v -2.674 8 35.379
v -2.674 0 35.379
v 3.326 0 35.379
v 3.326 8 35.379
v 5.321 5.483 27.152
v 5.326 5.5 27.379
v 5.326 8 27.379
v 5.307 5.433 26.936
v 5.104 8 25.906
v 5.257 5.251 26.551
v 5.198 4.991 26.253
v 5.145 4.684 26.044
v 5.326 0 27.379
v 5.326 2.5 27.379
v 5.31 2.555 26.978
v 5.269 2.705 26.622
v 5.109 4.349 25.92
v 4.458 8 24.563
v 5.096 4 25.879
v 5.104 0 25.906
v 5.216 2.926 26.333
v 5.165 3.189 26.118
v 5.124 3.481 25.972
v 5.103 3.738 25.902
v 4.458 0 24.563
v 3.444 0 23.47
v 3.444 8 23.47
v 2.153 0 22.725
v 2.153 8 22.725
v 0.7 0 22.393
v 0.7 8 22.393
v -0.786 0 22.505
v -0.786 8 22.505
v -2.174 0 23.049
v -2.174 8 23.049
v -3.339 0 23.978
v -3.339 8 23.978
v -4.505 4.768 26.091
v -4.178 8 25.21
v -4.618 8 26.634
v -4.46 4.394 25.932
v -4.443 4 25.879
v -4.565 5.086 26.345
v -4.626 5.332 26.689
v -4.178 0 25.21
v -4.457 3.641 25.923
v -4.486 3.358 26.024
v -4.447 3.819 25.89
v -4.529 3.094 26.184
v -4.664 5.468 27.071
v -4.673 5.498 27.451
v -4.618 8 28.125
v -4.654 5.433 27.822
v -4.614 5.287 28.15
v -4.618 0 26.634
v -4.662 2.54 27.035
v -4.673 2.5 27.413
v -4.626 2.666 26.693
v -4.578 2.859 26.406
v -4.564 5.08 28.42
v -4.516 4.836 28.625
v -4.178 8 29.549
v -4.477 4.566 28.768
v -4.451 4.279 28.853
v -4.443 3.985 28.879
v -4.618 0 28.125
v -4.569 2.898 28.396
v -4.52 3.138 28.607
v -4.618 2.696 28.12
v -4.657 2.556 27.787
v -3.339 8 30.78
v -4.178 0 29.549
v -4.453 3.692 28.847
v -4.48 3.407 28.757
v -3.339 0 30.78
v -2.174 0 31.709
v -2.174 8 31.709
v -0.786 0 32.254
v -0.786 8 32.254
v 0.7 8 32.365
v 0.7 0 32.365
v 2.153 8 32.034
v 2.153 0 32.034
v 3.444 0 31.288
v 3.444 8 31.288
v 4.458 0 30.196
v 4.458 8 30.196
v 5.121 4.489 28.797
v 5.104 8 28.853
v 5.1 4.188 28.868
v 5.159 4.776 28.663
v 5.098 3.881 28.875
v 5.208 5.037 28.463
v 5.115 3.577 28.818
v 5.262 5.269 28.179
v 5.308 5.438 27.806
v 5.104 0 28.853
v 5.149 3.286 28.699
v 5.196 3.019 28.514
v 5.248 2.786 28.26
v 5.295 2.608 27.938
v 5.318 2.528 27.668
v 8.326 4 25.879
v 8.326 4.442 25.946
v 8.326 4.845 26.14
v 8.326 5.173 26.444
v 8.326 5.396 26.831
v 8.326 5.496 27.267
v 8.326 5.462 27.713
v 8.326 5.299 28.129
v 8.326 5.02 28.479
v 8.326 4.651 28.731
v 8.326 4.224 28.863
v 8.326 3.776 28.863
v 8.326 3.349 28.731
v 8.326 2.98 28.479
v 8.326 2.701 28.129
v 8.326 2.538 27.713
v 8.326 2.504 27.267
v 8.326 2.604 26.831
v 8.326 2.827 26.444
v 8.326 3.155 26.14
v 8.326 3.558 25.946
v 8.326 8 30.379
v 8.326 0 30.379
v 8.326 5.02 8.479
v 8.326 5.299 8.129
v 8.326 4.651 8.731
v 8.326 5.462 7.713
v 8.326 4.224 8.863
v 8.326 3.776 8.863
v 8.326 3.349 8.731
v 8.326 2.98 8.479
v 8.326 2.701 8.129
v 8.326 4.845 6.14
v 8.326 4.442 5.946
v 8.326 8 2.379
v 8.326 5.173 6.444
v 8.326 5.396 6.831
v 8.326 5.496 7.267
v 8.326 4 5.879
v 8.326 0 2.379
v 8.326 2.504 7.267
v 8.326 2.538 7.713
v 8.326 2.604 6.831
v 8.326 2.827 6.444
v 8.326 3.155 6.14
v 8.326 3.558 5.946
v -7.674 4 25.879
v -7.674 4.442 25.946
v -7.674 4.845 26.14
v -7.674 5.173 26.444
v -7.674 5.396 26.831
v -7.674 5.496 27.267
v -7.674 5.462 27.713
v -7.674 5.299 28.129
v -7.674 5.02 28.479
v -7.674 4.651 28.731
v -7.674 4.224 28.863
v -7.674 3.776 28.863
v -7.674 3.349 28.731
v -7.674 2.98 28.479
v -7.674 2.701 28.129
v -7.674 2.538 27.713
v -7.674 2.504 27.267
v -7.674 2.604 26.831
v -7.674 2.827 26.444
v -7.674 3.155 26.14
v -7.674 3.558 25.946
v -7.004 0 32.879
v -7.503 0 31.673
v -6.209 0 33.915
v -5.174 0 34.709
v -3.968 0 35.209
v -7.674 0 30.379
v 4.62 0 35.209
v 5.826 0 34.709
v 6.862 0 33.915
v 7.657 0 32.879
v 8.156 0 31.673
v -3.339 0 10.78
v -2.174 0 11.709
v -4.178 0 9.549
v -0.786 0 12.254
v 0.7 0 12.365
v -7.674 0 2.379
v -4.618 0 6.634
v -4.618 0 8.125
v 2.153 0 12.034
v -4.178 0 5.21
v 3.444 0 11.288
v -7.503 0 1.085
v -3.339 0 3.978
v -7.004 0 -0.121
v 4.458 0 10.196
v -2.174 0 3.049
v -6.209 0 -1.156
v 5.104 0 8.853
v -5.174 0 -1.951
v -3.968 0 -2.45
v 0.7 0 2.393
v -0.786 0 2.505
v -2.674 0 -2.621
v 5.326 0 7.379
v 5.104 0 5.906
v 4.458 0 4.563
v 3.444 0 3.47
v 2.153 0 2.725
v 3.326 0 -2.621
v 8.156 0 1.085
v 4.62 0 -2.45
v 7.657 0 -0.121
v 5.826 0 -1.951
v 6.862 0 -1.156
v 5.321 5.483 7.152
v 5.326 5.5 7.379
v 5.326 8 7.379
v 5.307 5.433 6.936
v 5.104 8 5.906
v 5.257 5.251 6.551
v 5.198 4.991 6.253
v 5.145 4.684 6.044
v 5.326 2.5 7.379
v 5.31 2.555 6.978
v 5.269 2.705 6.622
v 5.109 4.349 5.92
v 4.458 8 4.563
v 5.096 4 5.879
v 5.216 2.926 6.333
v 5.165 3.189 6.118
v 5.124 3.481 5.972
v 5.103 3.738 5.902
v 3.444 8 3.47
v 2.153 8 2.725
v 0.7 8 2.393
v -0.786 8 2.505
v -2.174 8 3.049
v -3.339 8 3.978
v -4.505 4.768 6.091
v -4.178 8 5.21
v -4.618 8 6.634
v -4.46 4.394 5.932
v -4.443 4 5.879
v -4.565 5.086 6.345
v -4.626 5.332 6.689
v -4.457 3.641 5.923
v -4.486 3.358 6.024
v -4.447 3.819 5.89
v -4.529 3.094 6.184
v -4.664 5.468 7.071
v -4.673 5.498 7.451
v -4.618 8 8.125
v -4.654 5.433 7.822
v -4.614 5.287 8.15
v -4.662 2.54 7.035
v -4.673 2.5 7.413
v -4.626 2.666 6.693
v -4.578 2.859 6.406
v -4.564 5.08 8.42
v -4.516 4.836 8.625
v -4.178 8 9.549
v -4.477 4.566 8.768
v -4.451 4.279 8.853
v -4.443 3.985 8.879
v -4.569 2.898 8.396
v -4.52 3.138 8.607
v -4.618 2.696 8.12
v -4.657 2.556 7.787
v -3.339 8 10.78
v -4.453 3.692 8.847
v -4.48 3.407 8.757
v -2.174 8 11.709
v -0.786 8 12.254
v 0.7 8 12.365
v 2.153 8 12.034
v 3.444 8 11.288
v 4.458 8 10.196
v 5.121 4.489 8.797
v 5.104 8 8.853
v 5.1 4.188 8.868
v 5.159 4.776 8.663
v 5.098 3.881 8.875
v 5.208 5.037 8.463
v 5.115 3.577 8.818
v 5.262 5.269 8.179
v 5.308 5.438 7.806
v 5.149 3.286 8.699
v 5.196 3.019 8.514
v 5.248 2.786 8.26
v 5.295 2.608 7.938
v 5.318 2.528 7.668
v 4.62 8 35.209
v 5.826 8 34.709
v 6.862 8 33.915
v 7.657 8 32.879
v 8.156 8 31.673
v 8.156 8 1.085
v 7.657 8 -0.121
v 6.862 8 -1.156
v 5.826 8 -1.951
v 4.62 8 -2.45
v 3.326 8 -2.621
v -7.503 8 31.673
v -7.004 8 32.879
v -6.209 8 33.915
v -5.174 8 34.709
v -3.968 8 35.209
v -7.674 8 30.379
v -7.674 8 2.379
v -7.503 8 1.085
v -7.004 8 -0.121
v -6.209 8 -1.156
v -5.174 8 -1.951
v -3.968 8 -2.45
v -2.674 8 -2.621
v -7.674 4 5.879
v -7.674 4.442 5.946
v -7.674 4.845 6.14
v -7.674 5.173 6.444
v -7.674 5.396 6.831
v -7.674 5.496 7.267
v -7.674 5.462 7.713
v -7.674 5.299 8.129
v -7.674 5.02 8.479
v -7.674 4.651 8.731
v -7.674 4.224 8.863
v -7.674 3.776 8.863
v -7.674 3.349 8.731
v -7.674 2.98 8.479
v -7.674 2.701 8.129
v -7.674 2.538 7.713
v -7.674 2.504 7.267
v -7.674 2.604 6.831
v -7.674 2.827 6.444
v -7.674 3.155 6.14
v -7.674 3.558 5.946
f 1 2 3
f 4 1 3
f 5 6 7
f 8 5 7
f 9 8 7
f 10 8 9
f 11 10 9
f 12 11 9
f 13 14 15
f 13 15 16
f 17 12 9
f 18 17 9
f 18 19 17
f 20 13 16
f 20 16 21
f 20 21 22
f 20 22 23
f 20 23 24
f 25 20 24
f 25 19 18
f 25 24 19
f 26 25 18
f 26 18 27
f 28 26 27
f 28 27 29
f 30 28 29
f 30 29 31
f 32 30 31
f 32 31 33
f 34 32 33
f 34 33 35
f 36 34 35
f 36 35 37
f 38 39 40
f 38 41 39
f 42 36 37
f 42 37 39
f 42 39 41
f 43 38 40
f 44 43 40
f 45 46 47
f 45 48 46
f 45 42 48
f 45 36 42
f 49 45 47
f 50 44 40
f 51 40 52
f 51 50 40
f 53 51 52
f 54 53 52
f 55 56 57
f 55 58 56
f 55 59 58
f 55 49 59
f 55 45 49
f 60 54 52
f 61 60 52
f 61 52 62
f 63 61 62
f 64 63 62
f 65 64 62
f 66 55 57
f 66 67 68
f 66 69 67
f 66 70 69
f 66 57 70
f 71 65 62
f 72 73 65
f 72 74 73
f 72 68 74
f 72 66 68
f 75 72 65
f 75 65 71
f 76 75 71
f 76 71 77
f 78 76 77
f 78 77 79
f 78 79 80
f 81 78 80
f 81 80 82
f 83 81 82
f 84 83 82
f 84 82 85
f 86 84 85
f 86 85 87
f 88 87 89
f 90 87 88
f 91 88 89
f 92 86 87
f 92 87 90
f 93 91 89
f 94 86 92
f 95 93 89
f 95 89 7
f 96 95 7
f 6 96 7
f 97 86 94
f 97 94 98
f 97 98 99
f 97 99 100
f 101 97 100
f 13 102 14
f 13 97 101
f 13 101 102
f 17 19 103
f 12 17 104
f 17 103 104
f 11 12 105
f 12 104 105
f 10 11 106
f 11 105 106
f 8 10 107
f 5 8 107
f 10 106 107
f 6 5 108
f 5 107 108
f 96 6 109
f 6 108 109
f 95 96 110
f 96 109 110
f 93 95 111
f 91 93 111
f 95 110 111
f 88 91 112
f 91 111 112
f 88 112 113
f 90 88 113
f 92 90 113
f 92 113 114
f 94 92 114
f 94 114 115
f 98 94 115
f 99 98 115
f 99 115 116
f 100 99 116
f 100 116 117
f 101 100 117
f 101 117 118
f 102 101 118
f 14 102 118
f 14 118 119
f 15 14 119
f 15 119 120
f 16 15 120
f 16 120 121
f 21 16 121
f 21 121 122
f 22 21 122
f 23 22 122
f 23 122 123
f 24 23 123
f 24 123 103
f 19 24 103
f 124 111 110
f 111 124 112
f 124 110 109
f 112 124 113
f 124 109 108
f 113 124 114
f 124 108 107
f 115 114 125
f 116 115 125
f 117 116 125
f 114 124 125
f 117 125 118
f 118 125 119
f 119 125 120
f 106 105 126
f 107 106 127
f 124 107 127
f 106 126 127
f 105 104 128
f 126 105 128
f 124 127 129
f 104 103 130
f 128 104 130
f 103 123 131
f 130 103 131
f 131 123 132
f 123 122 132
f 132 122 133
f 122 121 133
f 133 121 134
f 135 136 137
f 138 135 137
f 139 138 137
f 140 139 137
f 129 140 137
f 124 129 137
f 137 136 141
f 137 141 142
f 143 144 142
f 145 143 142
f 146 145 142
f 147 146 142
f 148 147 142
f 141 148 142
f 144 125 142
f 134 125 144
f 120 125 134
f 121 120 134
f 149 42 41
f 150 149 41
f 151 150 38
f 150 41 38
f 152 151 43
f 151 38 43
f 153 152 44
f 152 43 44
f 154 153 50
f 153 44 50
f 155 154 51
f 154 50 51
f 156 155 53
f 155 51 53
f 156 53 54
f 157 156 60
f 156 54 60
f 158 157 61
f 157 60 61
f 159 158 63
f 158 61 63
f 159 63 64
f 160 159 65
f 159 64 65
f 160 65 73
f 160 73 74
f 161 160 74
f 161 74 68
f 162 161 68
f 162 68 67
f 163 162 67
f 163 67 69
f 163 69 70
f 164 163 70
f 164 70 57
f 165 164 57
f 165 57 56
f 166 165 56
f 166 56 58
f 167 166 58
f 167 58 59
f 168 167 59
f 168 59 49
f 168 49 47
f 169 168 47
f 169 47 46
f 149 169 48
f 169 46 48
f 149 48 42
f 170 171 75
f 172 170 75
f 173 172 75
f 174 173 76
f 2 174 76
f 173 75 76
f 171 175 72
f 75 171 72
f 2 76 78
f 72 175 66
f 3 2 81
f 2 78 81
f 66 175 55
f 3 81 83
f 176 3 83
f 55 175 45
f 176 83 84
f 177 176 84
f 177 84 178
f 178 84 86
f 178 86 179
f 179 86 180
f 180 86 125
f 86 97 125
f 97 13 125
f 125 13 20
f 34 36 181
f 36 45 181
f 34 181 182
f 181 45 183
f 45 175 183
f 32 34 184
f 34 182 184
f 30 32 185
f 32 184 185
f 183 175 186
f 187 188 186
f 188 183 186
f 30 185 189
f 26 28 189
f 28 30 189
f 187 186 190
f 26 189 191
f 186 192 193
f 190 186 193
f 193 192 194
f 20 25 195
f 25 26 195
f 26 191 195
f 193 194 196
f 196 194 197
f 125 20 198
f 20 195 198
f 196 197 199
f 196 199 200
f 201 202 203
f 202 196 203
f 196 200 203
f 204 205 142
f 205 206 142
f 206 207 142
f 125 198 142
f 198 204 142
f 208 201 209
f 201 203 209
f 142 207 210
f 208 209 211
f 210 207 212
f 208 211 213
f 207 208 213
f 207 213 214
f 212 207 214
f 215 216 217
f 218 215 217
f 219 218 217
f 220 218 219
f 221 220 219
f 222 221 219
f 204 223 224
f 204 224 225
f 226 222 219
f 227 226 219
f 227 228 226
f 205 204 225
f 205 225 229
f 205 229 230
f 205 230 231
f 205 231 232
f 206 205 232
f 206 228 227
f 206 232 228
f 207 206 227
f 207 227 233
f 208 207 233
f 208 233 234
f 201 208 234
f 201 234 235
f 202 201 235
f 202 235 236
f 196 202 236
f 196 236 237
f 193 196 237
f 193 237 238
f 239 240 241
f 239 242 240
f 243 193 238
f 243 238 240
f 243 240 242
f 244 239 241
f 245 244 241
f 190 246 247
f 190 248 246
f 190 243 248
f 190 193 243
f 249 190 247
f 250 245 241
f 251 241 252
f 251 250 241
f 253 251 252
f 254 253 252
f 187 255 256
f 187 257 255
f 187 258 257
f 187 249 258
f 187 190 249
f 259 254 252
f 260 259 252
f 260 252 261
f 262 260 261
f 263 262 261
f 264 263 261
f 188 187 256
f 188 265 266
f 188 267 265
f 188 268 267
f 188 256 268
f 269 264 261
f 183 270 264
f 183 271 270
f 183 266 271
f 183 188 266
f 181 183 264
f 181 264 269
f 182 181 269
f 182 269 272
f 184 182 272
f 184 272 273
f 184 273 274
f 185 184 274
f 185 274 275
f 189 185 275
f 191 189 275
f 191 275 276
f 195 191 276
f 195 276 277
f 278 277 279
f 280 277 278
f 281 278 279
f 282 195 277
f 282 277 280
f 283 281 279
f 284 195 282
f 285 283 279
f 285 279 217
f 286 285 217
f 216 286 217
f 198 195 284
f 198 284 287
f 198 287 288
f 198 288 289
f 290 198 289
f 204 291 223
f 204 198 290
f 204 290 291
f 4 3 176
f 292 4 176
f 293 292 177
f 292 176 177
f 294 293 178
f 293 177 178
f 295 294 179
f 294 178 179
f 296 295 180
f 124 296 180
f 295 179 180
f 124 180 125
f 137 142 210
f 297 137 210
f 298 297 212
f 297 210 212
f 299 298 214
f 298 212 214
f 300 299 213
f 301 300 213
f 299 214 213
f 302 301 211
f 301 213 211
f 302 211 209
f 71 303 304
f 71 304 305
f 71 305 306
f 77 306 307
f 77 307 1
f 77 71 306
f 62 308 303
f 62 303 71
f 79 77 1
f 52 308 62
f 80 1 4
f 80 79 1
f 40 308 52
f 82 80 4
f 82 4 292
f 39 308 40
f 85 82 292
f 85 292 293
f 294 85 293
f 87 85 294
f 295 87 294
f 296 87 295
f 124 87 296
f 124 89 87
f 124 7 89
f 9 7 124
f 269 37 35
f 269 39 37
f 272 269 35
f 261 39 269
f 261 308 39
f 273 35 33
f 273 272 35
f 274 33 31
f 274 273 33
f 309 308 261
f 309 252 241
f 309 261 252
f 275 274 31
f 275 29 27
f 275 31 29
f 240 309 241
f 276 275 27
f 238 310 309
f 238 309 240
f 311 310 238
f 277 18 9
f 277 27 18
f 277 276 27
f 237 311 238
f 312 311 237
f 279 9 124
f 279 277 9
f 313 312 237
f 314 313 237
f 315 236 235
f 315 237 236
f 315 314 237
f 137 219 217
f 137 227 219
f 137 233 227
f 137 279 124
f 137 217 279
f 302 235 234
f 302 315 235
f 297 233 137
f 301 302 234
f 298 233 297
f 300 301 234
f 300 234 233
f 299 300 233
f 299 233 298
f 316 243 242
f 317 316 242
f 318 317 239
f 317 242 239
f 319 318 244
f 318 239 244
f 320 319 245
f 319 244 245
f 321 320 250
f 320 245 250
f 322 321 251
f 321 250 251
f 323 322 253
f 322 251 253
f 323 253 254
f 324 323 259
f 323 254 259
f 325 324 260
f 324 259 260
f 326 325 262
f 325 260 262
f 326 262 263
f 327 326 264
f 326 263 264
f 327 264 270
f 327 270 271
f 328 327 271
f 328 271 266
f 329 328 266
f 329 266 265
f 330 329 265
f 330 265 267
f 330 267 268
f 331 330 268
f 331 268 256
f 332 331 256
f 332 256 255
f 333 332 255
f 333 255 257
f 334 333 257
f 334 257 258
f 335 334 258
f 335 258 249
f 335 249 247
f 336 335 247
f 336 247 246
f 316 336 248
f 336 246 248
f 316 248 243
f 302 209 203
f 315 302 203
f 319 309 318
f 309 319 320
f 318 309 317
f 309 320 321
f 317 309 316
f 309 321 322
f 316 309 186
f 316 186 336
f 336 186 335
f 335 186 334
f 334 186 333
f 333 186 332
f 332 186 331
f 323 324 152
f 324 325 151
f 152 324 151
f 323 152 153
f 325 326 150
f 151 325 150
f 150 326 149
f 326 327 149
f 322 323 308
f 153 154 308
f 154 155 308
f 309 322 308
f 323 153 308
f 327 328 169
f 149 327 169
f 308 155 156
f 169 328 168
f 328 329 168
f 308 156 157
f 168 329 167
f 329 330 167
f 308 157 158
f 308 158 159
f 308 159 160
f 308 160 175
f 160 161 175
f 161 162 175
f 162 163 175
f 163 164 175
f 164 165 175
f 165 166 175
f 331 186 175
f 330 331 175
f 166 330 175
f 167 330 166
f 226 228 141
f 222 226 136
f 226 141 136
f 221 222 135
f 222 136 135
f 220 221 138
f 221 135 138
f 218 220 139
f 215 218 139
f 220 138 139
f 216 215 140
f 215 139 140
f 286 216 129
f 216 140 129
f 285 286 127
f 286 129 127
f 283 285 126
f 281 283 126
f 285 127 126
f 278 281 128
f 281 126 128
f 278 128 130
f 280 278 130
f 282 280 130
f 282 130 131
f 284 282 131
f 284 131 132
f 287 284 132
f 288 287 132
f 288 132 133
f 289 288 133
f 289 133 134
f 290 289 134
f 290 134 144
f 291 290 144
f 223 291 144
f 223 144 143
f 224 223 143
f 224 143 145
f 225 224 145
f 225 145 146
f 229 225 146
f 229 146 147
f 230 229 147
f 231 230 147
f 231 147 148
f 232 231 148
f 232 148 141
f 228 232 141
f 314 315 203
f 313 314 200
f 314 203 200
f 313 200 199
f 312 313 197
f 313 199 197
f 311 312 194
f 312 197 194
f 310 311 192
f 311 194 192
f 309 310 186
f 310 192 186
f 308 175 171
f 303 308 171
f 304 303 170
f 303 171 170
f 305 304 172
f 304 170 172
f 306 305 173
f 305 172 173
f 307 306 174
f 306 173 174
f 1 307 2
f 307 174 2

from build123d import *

# Parameters (mm, degrees)
SKETCH1_R           = 5
BOSS_EXTRUDE1_DEPTH = 8
SKETCH2_R           = 1.5
CUT_EXTRUDE1_DEPTH  = 17


with BuildPart() as part:
    # Sketch1 → Boss-Extrude1 (new body)
    with BuildSketch(Plane(origin=(0, 0, 0), x_dir=(1, 0, 0), z_dir=(0, 1, 0))):
        with BuildLine():
            Line((-2.673601855, -35.379310345), (3.326398145, -35.379310345))
            ThreePointArc((3.326398145, -35.379310345), (6.861932051, -33.914844251), (8.326398145, -30.379310345))
            Line((8.326398145, -30.379310345), (8.326398145, -2.379310345))
            ThreePointArc((8.326398145, -2.379310345), (6.861932051, 1.156223561), (3.326398145, 2.620689655))
            Line((3.326398145, 2.620689655), (-2.673601855, 2.620689655))
            ThreePointArc((-2.673601855, 2.620689655), (-6.20913576, 1.156223561), (-7.673601855, -2.379310345))
            Line((-7.673601855, -2.379310345), (-7.673601855, -30.379310345))
            ThreePointArc((-7.673601855, -30.379310345), (-6.20913576, -33.914844251), (-2.673601855, -35.379310345))
        make_face()
        with Locations((0.326398145, -27.379310345)):
            Circle(SKETCH1_R, mode=Mode.SUBTRACT)
        with Locations((0.326398145, -7.379310345)):
            Circle(SKETCH1_R, mode=Mode.SUBTRACT)
    extrude(amount=BOSS_EXTRUDE1_DEPTH)

    # Sketch2 → Cut-Extrude1 (cut, through all)
    with BuildSketch(Plane(origin=(8.326398145, 0, 0), x_dir=(0, 0, -1), z_dir=(1, 0, 0))):
        with Locations((-27.379310345, 4)):
            Circle(SKETCH2_R)
        with Locations((-7.379310345, 4)):
            Circle(SKETCH2_R)
    extrude(amount=-CUT_EXTRUDE1_DEPTH, mode=Mode.SUBTRACT)


solid = part.part
